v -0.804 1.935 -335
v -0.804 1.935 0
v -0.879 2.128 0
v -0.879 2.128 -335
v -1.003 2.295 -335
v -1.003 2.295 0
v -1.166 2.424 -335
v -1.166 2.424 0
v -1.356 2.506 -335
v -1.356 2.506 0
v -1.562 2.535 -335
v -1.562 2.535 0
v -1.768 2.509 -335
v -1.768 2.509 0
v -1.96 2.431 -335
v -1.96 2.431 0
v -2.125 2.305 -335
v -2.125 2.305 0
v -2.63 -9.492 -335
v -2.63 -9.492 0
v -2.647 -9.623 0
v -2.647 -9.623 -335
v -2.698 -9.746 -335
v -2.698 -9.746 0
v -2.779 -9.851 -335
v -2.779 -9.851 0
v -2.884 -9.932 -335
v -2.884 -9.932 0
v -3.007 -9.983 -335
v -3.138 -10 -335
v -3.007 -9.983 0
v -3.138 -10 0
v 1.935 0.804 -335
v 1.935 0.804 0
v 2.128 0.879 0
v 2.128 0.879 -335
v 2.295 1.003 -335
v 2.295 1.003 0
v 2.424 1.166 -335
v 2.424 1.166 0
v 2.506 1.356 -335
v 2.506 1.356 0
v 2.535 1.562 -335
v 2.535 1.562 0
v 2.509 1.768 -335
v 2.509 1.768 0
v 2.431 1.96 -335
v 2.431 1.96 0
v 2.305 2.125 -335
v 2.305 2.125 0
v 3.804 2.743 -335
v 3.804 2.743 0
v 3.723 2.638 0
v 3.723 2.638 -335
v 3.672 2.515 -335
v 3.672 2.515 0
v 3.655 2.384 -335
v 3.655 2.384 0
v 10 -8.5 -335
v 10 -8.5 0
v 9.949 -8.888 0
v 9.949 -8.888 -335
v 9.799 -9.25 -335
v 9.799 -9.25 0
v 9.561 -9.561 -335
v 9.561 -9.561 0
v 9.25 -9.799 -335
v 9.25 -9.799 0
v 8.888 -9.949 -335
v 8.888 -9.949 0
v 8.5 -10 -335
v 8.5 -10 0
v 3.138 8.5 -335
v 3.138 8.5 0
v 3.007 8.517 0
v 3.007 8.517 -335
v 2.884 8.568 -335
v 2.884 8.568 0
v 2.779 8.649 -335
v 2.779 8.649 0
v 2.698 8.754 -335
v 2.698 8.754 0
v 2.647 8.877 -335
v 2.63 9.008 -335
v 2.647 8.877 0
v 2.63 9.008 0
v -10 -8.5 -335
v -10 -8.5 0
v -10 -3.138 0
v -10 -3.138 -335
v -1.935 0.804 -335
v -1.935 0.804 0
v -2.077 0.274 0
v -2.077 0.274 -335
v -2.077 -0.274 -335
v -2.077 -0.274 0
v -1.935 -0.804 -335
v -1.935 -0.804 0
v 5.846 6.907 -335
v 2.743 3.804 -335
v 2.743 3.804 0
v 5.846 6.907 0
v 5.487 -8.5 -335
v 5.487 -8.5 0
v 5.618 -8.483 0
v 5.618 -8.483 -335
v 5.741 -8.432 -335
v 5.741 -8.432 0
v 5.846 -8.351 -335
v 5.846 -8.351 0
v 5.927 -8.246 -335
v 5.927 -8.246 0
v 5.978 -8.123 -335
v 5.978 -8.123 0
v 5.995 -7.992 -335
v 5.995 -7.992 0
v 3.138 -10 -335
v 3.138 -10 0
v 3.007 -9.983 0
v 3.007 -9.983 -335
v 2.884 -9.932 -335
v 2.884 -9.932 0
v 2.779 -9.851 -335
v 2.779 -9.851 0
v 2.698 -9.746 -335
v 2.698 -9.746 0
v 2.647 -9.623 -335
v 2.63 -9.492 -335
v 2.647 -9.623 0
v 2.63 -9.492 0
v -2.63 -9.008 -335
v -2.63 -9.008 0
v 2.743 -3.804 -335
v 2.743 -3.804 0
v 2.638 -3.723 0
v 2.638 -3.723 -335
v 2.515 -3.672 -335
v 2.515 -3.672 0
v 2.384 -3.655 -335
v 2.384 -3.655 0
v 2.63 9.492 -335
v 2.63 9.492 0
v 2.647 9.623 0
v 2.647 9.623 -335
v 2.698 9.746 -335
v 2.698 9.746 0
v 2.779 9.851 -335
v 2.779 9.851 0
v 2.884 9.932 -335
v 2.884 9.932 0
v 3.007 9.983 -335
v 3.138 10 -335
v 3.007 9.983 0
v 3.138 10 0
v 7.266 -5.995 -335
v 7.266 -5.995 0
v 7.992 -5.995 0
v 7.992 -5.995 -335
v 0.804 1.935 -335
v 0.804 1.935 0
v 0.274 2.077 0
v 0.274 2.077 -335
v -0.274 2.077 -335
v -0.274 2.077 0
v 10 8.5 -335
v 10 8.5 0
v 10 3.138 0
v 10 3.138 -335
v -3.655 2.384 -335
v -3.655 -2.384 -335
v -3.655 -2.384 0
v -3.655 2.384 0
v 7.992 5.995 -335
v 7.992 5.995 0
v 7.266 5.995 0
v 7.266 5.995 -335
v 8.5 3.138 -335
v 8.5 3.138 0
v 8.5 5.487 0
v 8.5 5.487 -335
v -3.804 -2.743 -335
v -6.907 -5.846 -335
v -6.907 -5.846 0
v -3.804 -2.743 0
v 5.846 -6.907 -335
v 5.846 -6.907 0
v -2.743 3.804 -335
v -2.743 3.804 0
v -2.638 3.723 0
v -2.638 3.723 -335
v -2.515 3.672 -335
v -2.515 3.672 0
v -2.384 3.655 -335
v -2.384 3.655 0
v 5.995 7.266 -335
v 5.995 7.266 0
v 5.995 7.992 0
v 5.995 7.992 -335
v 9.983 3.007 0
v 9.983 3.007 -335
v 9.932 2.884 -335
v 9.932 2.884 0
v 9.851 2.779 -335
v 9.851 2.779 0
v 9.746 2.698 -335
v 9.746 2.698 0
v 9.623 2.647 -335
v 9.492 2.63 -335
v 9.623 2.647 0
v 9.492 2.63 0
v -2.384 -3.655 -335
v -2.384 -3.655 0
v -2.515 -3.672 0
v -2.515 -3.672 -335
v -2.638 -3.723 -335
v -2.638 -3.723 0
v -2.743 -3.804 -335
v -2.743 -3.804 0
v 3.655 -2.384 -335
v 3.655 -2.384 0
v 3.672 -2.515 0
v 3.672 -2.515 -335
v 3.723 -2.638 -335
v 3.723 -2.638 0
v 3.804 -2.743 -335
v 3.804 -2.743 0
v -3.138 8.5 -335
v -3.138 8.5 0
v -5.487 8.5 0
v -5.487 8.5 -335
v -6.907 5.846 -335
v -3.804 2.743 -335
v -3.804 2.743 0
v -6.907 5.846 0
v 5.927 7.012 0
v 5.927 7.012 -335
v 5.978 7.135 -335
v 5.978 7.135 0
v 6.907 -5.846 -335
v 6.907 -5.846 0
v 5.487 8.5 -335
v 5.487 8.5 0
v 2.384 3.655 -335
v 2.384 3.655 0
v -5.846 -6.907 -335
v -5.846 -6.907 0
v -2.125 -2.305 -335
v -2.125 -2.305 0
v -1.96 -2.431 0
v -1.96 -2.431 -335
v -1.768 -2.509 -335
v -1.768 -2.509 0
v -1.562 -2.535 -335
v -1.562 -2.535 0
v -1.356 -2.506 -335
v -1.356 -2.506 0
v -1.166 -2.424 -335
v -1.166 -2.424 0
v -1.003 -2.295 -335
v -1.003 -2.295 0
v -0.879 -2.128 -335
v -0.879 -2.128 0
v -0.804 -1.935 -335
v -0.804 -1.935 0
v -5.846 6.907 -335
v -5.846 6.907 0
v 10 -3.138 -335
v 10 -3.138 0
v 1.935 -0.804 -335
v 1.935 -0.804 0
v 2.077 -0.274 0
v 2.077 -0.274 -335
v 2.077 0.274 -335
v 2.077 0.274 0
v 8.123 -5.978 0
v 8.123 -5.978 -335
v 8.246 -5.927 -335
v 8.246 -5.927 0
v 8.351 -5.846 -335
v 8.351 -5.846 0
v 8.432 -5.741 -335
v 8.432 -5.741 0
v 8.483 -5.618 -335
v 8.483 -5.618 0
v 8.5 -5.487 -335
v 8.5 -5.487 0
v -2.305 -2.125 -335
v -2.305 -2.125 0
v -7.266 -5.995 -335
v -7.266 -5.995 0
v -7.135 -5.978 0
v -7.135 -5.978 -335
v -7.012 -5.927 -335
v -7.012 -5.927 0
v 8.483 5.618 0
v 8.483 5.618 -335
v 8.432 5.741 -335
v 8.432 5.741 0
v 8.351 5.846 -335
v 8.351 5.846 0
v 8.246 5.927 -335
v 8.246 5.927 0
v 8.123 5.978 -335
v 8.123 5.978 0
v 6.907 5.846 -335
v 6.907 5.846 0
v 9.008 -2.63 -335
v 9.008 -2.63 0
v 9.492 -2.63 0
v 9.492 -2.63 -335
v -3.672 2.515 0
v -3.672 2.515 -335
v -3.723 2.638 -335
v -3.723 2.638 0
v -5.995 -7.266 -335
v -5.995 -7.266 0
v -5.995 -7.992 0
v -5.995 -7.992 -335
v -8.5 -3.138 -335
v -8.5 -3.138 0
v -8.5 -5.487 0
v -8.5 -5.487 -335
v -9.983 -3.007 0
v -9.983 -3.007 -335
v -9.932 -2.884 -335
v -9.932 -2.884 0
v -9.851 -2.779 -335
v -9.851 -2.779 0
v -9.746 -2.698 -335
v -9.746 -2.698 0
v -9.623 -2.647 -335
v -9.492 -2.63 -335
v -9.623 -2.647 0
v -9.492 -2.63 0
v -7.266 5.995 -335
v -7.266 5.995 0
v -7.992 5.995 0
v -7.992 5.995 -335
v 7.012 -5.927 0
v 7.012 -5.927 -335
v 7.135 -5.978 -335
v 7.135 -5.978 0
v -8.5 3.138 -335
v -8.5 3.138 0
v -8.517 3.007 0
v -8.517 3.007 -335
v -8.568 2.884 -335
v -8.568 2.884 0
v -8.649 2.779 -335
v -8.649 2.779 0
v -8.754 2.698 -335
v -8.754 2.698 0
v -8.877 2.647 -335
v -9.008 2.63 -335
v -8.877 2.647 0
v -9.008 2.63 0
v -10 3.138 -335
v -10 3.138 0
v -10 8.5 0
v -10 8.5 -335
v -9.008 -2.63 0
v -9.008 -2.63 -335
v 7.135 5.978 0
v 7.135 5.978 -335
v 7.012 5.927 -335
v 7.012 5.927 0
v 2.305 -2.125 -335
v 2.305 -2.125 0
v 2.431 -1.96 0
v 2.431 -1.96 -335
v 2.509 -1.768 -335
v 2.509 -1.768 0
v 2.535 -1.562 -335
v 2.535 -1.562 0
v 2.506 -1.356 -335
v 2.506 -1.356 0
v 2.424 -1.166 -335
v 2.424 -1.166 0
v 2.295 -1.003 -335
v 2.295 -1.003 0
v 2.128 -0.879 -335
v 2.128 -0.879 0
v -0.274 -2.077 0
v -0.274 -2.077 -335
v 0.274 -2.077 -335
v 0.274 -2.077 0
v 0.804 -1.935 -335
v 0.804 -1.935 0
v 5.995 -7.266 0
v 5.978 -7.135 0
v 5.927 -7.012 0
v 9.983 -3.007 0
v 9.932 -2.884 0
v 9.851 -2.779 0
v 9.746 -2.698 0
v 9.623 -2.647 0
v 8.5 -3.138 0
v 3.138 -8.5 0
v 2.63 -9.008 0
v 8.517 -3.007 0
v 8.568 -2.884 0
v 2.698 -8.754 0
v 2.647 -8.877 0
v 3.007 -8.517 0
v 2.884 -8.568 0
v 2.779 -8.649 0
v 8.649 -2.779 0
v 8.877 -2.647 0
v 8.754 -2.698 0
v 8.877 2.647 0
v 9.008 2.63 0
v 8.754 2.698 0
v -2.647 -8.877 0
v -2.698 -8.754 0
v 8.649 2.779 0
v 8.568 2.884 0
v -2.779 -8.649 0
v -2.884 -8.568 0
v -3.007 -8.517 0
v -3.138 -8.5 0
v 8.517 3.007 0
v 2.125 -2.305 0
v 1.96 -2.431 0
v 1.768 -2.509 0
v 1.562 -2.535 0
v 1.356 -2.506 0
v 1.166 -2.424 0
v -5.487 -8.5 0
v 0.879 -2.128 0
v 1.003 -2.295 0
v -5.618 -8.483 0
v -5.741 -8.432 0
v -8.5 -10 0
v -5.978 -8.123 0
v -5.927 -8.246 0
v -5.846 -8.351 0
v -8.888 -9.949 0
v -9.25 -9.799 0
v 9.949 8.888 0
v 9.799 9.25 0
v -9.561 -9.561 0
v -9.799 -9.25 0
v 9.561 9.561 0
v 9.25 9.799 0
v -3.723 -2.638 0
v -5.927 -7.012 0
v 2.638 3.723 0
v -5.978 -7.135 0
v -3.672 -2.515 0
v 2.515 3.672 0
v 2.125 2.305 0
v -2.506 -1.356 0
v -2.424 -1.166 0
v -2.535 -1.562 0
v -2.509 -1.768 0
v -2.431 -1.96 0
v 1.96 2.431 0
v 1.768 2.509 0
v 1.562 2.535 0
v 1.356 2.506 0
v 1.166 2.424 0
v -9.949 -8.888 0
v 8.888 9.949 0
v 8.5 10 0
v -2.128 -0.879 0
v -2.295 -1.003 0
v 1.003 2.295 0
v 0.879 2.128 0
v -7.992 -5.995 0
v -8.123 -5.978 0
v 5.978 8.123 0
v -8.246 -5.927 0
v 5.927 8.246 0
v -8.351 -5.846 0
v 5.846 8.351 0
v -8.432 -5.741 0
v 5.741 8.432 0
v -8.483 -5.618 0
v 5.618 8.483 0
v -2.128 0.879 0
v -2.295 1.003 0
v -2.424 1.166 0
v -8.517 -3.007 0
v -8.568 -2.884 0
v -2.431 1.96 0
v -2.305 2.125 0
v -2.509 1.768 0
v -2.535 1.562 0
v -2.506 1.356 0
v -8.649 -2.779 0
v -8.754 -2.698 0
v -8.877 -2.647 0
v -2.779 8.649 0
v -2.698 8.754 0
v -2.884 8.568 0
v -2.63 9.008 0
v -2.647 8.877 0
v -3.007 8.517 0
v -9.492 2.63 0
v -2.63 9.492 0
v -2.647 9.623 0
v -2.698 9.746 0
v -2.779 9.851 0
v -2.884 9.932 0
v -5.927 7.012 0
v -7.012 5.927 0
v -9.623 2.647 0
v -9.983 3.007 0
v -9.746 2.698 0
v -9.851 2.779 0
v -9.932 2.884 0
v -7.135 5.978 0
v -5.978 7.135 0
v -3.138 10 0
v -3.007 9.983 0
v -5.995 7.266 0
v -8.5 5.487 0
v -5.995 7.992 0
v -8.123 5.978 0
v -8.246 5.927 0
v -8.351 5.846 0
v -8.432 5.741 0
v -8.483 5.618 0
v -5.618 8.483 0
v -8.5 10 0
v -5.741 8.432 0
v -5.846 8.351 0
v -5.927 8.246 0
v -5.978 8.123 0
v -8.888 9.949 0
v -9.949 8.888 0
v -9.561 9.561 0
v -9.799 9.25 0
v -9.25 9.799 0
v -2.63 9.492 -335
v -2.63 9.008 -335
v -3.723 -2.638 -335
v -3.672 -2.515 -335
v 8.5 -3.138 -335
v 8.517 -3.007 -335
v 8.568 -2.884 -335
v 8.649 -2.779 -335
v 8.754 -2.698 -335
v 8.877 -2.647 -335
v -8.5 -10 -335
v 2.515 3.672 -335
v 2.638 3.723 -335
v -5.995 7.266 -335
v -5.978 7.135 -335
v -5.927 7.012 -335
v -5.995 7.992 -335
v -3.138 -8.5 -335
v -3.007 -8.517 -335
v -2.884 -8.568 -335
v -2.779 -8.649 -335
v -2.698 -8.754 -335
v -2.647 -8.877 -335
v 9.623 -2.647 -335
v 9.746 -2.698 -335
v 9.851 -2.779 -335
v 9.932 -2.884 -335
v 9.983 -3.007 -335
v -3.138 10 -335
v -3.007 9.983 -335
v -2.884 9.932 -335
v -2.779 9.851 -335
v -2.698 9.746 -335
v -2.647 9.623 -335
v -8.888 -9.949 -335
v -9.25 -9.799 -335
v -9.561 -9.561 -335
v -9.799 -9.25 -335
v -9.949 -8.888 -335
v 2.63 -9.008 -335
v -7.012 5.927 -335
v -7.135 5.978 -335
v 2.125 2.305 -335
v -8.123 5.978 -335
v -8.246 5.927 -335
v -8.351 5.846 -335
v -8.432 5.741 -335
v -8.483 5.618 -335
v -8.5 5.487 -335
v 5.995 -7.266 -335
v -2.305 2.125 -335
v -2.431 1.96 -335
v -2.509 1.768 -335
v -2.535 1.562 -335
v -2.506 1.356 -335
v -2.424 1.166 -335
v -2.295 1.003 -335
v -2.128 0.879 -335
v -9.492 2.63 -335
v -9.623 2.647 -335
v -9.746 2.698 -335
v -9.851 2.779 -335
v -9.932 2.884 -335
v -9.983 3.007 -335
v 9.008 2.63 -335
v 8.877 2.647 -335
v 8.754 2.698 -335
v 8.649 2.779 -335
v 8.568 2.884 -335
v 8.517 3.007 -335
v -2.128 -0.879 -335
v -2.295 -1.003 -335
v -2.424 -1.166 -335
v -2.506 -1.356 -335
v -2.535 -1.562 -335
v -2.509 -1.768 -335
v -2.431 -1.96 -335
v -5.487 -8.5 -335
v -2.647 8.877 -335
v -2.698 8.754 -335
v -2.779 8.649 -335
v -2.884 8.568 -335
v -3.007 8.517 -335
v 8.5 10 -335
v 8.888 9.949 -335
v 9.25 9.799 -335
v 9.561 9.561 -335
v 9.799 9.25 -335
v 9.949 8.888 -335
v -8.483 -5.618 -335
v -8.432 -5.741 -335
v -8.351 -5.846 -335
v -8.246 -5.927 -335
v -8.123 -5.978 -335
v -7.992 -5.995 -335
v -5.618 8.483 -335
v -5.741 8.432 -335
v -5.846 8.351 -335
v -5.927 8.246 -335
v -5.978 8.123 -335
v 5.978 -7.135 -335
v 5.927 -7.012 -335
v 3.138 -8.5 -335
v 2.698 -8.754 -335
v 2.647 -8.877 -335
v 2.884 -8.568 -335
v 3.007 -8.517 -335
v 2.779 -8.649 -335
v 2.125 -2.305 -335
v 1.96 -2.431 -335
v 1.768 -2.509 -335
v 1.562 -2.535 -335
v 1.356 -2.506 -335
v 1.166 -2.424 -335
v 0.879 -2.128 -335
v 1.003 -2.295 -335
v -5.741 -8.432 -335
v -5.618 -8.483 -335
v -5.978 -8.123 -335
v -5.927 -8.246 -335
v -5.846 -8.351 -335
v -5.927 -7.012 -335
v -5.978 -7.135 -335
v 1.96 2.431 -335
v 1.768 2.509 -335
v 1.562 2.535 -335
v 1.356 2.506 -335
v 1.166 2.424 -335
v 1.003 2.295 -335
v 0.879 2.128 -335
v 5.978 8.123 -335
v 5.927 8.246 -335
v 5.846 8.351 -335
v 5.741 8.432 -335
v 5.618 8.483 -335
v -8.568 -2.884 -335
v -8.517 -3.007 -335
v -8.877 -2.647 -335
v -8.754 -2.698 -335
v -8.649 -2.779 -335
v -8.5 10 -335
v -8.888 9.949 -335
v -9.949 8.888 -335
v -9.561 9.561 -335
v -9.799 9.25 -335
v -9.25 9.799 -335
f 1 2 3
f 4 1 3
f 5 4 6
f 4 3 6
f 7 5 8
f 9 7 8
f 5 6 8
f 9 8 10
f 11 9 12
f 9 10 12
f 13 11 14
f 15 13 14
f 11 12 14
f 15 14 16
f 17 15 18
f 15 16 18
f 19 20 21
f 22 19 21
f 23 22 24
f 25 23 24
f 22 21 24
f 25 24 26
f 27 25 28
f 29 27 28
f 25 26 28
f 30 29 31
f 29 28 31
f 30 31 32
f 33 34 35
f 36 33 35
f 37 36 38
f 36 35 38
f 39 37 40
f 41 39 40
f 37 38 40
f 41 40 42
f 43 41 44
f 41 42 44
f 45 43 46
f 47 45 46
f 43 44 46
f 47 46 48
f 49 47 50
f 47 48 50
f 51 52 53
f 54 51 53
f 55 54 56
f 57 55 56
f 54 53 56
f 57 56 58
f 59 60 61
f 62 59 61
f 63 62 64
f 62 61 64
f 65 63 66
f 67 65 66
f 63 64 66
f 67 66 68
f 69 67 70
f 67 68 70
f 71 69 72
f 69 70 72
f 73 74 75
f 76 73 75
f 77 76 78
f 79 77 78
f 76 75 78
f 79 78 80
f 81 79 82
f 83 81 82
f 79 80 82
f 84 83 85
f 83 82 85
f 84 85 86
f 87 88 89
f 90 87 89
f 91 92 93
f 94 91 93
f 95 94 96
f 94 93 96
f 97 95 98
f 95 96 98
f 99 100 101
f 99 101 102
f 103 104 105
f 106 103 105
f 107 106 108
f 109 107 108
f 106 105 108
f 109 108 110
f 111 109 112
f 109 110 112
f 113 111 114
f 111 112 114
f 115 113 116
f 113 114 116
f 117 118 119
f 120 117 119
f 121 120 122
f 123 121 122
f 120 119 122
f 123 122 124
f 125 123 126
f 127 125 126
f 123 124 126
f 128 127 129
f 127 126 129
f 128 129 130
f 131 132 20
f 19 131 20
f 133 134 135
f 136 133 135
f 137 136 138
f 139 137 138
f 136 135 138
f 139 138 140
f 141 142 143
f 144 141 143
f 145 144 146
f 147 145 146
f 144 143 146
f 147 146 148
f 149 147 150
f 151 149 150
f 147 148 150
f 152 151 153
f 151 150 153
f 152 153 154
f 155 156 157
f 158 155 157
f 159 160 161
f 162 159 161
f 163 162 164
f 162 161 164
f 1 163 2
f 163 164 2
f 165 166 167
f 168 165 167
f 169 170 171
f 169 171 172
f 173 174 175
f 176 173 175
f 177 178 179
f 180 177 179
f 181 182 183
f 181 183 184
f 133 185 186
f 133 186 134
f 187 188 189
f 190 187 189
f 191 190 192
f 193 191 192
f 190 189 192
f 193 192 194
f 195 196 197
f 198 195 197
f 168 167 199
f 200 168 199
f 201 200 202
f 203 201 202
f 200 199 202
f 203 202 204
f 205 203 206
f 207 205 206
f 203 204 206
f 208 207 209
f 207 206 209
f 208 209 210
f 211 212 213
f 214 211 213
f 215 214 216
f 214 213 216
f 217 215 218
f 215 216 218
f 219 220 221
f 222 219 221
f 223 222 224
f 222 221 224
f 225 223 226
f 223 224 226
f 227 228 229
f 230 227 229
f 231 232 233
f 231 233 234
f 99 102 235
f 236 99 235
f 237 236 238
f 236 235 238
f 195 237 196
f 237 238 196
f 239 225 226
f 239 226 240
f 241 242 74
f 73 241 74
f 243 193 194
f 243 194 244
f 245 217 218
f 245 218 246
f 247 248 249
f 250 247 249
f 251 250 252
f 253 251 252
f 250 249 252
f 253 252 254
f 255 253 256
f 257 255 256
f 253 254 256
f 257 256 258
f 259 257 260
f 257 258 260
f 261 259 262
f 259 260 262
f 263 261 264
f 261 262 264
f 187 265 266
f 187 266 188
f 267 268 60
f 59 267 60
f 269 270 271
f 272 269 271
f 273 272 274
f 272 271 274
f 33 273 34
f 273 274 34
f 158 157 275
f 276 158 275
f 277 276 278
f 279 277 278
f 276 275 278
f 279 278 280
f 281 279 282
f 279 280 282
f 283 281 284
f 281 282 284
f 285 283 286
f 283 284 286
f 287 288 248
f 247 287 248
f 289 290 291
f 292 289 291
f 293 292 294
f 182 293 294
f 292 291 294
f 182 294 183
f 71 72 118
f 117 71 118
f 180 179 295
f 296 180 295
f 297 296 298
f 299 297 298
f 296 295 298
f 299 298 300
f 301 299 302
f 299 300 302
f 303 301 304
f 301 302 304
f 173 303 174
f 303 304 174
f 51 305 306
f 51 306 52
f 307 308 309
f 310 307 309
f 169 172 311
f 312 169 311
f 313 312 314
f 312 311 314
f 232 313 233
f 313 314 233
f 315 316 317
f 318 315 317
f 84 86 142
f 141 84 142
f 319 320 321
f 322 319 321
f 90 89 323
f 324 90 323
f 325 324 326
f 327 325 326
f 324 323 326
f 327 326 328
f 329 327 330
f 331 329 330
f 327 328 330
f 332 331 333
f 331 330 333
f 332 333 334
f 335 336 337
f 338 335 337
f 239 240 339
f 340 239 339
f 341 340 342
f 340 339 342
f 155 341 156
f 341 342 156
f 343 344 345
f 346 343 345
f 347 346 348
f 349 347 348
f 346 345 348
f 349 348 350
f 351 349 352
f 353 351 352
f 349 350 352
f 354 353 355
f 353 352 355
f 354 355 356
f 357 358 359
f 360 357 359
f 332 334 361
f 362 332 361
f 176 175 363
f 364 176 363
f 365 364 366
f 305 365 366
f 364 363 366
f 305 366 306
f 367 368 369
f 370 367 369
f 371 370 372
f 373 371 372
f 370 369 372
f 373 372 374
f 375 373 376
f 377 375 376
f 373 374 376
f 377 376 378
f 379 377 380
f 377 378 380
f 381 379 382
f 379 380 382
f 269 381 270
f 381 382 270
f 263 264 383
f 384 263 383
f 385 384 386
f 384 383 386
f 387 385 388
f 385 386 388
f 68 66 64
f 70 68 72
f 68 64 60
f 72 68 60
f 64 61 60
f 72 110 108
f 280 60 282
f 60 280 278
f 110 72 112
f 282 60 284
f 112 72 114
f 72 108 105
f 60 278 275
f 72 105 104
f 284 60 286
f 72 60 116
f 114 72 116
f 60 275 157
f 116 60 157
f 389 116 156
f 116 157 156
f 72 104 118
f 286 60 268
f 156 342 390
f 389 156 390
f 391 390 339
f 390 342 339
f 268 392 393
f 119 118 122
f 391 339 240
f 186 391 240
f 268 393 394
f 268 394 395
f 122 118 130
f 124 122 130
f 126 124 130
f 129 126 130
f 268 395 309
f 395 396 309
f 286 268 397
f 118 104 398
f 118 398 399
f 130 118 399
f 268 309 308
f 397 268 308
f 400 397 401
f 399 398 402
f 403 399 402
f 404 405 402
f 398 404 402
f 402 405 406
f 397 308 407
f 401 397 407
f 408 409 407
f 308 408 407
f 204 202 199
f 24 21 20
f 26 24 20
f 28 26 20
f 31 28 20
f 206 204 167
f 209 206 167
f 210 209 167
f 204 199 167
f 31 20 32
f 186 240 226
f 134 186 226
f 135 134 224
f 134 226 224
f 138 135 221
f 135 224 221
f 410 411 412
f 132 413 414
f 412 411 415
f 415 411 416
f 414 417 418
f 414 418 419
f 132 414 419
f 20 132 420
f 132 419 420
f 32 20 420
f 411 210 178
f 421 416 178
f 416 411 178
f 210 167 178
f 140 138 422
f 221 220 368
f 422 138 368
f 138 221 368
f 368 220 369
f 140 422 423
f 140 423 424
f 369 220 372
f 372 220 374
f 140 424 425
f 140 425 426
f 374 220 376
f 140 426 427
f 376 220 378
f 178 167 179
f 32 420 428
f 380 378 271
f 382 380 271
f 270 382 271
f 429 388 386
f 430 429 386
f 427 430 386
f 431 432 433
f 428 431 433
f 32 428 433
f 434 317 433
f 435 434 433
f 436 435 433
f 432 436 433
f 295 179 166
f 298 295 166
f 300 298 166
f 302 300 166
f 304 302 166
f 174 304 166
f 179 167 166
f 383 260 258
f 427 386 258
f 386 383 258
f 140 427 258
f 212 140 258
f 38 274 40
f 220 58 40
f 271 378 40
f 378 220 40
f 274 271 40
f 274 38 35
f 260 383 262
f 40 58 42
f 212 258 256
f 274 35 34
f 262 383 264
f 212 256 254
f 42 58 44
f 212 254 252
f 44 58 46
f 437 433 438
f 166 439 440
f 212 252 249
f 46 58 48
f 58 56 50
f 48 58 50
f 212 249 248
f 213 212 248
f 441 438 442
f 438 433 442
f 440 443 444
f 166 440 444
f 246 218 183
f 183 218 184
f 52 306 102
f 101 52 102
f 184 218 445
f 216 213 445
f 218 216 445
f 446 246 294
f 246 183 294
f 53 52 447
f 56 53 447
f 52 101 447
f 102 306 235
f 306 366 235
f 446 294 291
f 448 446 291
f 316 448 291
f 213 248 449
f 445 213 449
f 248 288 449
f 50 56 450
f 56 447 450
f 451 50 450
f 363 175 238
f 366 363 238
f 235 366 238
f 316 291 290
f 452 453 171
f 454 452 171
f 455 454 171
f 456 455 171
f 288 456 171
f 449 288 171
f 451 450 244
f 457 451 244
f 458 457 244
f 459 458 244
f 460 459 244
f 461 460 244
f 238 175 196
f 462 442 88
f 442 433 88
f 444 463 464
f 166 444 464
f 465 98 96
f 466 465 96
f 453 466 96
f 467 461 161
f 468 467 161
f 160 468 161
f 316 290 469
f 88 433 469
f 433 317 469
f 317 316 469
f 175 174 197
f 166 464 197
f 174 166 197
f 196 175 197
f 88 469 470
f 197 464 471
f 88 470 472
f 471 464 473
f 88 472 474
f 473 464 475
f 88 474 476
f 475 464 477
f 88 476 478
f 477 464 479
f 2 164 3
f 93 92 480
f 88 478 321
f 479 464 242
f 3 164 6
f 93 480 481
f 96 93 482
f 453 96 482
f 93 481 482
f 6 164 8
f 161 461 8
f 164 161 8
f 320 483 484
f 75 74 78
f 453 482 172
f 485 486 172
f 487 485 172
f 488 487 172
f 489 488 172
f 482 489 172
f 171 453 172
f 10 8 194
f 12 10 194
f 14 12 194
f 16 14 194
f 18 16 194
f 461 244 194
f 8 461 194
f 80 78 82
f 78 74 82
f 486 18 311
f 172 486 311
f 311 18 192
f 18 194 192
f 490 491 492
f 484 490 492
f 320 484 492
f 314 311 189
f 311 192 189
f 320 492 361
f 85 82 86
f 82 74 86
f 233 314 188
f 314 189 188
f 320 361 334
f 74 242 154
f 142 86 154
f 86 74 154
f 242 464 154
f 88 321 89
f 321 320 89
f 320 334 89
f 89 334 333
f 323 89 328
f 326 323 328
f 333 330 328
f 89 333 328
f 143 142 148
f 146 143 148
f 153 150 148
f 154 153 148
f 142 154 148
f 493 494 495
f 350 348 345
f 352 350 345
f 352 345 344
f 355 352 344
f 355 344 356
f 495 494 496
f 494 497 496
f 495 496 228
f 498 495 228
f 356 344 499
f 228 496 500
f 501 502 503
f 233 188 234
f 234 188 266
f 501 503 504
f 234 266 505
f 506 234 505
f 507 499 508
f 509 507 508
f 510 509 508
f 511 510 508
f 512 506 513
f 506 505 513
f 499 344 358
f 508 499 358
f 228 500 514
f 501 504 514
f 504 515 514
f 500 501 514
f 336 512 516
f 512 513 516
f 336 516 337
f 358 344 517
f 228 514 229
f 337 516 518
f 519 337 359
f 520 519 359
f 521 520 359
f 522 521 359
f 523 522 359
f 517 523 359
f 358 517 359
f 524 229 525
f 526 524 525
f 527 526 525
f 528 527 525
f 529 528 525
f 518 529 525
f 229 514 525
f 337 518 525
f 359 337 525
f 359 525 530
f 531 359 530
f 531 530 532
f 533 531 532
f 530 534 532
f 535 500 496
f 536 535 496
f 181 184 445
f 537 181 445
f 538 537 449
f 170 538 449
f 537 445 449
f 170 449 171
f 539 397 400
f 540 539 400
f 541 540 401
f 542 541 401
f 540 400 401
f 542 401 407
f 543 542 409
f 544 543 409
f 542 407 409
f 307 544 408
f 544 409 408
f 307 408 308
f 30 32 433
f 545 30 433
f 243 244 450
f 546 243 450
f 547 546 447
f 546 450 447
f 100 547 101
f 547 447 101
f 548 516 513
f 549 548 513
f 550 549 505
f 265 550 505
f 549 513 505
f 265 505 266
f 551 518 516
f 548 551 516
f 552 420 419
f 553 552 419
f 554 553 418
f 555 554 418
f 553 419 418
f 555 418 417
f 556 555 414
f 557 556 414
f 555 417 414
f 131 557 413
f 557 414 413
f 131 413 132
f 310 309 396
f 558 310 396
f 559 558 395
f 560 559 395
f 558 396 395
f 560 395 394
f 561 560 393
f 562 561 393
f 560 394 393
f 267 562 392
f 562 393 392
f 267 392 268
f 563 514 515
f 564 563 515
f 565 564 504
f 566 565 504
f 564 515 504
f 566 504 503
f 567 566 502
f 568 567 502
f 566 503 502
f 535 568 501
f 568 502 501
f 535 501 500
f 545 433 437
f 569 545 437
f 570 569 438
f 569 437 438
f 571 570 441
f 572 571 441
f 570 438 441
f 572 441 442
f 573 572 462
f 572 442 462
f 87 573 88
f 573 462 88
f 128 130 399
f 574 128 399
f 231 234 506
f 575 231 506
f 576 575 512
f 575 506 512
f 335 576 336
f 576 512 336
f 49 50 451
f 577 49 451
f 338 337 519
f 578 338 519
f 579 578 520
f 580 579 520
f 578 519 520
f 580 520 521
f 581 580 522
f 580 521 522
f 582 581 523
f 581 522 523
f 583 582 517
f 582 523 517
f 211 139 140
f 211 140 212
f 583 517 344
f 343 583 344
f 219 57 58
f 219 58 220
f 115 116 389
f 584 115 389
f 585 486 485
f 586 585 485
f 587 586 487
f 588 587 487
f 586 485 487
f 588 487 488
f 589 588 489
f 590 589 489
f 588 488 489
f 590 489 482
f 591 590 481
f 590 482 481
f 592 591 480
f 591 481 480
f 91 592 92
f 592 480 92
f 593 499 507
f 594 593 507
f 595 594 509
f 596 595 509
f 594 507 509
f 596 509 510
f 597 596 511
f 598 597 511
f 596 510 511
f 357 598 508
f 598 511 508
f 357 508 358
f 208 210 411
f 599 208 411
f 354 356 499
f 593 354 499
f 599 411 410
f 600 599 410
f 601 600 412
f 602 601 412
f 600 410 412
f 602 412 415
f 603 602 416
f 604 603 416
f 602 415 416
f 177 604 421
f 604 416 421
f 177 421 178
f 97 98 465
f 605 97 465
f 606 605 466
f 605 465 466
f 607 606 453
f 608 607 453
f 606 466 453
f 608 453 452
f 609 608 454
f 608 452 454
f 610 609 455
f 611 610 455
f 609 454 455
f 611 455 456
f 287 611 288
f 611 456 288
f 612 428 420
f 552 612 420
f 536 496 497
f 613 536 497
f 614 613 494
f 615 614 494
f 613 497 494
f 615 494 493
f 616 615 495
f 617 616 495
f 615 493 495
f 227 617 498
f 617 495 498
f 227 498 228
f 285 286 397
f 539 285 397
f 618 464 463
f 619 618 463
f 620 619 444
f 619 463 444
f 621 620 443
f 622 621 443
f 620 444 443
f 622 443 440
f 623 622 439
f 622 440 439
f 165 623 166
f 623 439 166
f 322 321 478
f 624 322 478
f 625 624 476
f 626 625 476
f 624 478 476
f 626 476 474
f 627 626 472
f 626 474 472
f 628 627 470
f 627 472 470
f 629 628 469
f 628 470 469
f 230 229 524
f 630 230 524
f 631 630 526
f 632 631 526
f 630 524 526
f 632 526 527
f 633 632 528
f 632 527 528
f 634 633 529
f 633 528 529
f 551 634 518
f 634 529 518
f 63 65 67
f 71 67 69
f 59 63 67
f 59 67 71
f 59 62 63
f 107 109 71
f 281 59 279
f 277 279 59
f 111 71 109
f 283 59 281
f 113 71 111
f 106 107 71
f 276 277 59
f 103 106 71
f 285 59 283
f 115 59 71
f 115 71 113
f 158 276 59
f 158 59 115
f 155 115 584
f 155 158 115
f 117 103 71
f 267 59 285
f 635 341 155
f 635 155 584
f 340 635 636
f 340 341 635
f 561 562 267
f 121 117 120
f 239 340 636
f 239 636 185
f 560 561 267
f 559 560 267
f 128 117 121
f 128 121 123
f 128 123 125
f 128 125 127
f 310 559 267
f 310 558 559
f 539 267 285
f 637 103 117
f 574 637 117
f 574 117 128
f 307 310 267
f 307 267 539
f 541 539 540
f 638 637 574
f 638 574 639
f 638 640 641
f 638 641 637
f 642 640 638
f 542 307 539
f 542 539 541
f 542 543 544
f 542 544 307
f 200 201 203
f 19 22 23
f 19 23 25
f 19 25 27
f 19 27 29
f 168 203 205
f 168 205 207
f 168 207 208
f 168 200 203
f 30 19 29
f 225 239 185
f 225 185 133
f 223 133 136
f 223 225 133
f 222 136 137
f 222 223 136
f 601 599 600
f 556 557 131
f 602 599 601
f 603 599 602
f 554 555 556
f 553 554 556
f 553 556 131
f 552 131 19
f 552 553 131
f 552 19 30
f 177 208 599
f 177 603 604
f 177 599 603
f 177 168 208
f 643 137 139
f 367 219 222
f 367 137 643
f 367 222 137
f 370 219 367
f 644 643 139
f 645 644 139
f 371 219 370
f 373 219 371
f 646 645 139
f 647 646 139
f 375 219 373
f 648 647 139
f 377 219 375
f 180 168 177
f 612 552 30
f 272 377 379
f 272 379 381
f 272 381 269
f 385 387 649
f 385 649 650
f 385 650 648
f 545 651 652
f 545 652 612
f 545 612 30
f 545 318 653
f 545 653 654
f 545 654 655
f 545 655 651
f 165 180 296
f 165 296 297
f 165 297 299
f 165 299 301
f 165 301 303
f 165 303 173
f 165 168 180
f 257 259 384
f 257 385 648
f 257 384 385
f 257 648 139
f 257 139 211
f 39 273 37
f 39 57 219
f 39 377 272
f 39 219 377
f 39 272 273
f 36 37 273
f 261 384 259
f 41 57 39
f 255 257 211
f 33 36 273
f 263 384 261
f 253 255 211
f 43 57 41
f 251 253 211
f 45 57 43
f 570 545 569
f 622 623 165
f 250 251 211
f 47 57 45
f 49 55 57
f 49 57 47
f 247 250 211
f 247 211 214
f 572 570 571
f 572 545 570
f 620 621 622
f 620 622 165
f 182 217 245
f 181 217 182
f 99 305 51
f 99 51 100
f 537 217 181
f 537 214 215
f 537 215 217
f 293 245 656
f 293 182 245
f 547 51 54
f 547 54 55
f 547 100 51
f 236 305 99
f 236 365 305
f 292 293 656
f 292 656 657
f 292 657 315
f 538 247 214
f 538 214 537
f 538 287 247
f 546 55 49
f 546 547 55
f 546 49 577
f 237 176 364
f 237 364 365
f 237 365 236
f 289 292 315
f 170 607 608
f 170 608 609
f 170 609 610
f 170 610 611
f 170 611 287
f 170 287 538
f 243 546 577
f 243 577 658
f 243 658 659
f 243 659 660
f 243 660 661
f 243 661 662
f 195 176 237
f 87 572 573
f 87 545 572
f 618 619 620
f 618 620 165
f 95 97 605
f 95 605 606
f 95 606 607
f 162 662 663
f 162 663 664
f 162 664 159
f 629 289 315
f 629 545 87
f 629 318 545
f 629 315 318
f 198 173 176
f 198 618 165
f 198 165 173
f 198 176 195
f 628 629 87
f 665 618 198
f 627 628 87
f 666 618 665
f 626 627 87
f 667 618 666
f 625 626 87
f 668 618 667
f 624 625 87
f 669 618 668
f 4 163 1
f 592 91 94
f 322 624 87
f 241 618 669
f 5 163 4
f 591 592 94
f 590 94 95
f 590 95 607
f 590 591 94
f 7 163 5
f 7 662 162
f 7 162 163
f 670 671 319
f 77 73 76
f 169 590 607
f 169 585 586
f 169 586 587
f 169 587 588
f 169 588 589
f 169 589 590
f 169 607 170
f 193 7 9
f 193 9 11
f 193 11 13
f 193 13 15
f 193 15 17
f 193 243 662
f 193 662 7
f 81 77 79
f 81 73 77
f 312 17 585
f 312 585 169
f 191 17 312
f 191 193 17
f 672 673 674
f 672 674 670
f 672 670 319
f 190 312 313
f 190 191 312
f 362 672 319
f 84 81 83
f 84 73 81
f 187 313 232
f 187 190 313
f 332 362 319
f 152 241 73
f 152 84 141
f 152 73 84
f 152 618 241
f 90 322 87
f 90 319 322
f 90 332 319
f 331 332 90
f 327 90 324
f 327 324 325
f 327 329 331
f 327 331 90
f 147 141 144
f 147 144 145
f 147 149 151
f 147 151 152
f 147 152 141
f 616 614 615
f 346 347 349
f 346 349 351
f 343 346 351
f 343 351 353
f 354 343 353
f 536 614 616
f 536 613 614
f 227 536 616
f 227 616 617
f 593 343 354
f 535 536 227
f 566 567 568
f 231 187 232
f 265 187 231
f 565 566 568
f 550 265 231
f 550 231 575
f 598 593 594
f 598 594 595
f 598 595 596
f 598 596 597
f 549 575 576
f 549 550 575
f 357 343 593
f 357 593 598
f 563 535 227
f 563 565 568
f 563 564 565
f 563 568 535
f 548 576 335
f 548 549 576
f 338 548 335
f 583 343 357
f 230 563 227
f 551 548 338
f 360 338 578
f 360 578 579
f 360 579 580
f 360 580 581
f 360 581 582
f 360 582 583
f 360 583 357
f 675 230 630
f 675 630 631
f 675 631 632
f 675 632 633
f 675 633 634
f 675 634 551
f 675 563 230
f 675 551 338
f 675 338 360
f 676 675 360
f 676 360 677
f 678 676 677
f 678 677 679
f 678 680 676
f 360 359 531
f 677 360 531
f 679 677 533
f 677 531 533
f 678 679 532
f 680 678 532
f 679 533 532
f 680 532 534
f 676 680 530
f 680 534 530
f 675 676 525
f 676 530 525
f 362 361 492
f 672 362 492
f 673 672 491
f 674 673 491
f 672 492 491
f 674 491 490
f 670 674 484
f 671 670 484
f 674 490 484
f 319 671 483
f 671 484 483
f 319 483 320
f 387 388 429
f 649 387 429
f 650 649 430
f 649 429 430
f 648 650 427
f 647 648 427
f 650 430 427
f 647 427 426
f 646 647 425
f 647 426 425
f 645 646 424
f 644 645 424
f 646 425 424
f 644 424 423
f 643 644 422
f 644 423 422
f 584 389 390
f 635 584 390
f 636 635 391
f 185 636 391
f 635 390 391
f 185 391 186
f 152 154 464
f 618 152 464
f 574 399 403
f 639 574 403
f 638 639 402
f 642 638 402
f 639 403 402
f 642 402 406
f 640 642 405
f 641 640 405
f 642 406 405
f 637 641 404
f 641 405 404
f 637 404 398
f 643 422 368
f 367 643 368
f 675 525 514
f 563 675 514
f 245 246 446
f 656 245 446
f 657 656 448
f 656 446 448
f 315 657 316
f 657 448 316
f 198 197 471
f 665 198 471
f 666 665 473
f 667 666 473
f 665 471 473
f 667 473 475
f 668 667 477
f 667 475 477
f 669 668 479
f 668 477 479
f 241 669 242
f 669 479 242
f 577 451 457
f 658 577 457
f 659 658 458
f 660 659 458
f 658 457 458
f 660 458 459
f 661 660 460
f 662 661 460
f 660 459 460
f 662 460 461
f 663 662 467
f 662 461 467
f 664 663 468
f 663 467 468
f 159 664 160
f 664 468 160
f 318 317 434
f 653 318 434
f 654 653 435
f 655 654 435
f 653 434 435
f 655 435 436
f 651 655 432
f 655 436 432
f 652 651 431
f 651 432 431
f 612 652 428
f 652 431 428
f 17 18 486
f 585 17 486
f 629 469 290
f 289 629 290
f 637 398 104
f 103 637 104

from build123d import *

# Parameters (mm, degrees)
EXTRUDE1_DEPTH = 335


with BuildPart() as part:
    # Sketch1 → Extrude1 (new body)
    with BuildSketch(Plane.XY):
        with BuildLine():
            Line((9.492, 2.63), (9.008, 2.63))
            ThreePointArc((9.008, 2.63), (8.648789755, 2.778789755), (8.5, 3.138))
            Line((8.5, 3.138), (8.5, 5.487))
            ThreePointArc((8.5, 5.487), (8.351210245, 5.846210245), (7.992, 5.995))
            Line((7.992, 5.995), (7.266080661, 5.995))
            ThreePointArc((7.266080661, 5.995), (7.071677478, 5.956330803), (6.906870417, 5.846210245))
            Line((6.906870417, 5.846210245), (3.803789755, 2.743129583))
            ThreePointArc((3.803789755, 2.743129583), (3.693669197, 2.578322522), (3.655, 2.383919339))
            Line((3.655, 2.383919339), (3.655, -2.383919339))
            ThreePointArc((3.655, -2.383919339), (3.693669197, -2.578322522), (3.803789755, -2.743129583))
            Line((3.803789755, -2.743129583), (6.906870417, -5.846210245))
            ThreePointArc((6.906870417, -5.846210245), (7.071677478, -5.956330803), (7.266080661, -5.995))
            Line((7.266080661, -5.995), (7.992, -5.995))
            ThreePointArc((7.992, -5.995), (8.351210245, -5.846210245), (8.5, -5.487))
            Line((8.5, -5.487), (8.5, -3.138))
            ThreePointArc((8.5, -3.138), (8.648789755, -2.778789755), (9.008, -2.63))
            Line((9.008, -2.63), (9.492, -2.63))
            ThreePointArc((9.492, -2.63), (9.851210245, -2.778789755), (10, -3.138))
            Line((10, -3.138), (10, -8.5))
            ThreePointArc((10, -8.5), (9.560660172, -9.560660172), (8.5, -10))
            Line((8.5, -10), (3.138, -10))
            ThreePointArc((3.138, -10), (2.778789755, -9.851210245), (2.63, -9.492))
            Line((2.63, -9.492), (2.63, -9.008))
            ThreePointArc((2.63, -9.008), (2.778789755, -8.648789755), (3.138, -8.5))
            Line((3.138, -8.5), (5.487, -8.5))
            ThreePointArc((5.487, -8.5), (5.846210245, -8.351210245), (5.995, -7.992))
            Line((5.995, -7.992), (5.995, -7.266080661))
            ThreePointArc((5.995, -7.266080661), (5.956330803, -7.071677478), (5.846210245, -6.906870417))
            Line((5.846210245, -6.906870417), (2.743129583, -3.803789755))
            ThreePointArc((2.743129583, -3.803789755), (2.578322522, -3.693669197), (2.383919339, -3.655))
            Line((2.383919339, -3.655), (-2.383919339, -3.655))
            ThreePointArc((-2.383919339, -3.655), (-2.578322522, -3.693669197), (-2.743129583, -3.803789755))
            Line((-2.743129583, -3.803789755), (-5.846210245, -6.906870417))
            ThreePointArc((-5.846210245, -6.906870417), (-5.956330803, -7.071677478), (-5.995, -7.266080661))
            Line((-5.995, -7.266080661), (-5.995, -7.992))
            ThreePointArc((-5.995, -7.992), (-5.846210245, -8.351210245), (-5.487, -8.5))
            Line((-5.487, -8.5), (-3.138, -8.5))
            ThreePointArc((-3.138, -8.5), (-2.778789755, -8.648789755), (-2.63, -9.008))
            Line((-2.63, -9.008), (-2.63, -9.492))
            ThreePointArc((-2.63, -9.492), (-2.778789755, -9.851210245), (-3.138, -10))
            Line((-3.138, -10), (-8.5, -10))
            ThreePointArc((-8.5, -10), (-9.560660172, -9.560660172), (-10, -8.5))
            Line((-10, -8.5), (-10, -3.138))
            ThreePointArc((-10, -3.138), (-9.851210245, -2.778789755), (-9.492, -2.63))
            Line((-9.492, -2.63), (-9.008, -2.63))
            ThreePointArc((-9.008, -2.63), (-8.648789755, -2.778789755), (-8.5, -3.138))
            Line((-8.5, -3.138), (-8.5, -5.487))
            ThreePointArc((-8.5, -5.487), (-8.351210245, -5.846210245), (-7.992, -5.995))
            Line((-7.992, -5.995), (-7.266080661, -5.995))
            ThreePointArc((-7.266080661, -5.995), (-7.071677478, -5.956330803), (-6.906870417, -5.846210245))
            Line((-6.906870417, -5.846210245), (-3.803789755, -2.743129583))
            ThreePointArc((-3.803789755, -2.743129583), (-3.693669197, -2.578322522), (-3.655, -2.383919339))
            Line((-3.655, -2.383919339), (-3.655, 2.383919339))
            ThreePointArc((-3.655, 2.383919339), (-3.693669197, 2.578322522), (-3.803789755, 2.743129583))
            Line((-3.803789755, 2.743129583), (-6.906870417, 5.846210245))
            ThreePointArc((-6.906870417, 5.846210245), (-7.071677478, 5.956330803), (-7.266080661, 5.995))
            Line((-7.266080661, 5.995), (-7.992, 5.995))
            ThreePointArc((-7.992, 5.995), (-8.351210245, 5.846210245), (-8.5, 5.487))
            Line((-8.5, 5.487), (-8.5, 3.138))
            ThreePointArc((-8.5, 3.138), (-8.648789755, 2.778789755), (-9.008, 2.63))
            Line((-9.008, 2.63), (-9.492, 2.63))
            ThreePointArc((-9.492, 2.63), (-9.851210245, 2.778789755), (-10, 3.138))
            Line((-10, 3.138), (-10, 8.5))
            ThreePointArc((-10, 8.5), (-9.560660172, 9.560660172), (-8.5, 10))
            Line((-8.5, 10), (-3.138, 10))
            ThreePointArc((-3.138, 10), (-2.778789755, 9.851210245), (-2.63, 9.492))
            Line((-2.63, 9.492), (-2.63, 9.008))
            ThreePointArc((-2.63, 9.008), (-2.778789755, 8.648789755), (-3.138, 8.5))
            Line((-3.138, 8.5), (-5.487, 8.5))
            ThreePointArc((-5.487, 8.5), (-5.846210245, 8.351210245), (-5.995, 7.992))
            Line((-5.995, 7.992), (-5.995, 7.266080661))
            ThreePointArc((-5.995, 7.266080661), (-5.956330803, 7.071677478), (-5.846210245, 6.906870417))
            Line((-5.846210245, 6.906870417), (-2.743129583, 3.803789755))
            ThreePointArc((-2.743129583, 3.803789755), (-2.578322522, 3.693669197), (-2.383919339, 3.655))
            Line((-2.383919339, 3.655), (2.383919339, 3.655))
            ThreePointArc((2.383919339, 3.655), (2.578322522, 3.693669197), (2.743129583, 3.803789755))
            Line((2.743129583, 3.803789755), (5.846210245, 6.906870417))
            ThreePointArc((5.846210245, 6.906870417), (5.956330803, 7.071677478), (5.995, 7.266080661))
            Line((5.995, 7.266080661), (5.995, 7.992))
            ThreePointArc((5.995, 7.992), (5.846210245, 8.351210245), (5.487, 8.5))
            Line((5.487, 8.5), (3.138, 8.5))
            ThreePointArc((3.138, 8.5), (2.778789755, 8.648789755), (2.63, 9.008))
            Line((2.63, 9.008), (2.63, 9.492))
            ThreePointArc((2.63, 9.492), (2.778789755, 9.851210245), (3.138, 10))
            Line((3.138, 10), (8.5, 10))
            ThreePointArc((8.5, 10), (9.560660172, 9.560660172), (10, 8.5))
            Line((10, 8.5), (10, 3.138))
            ThreePointArc((10, 3.138), (9.851210245, 2.778789755), (9.492, 2.63))
        make_face()
        with BuildLine():
            Line((2.124900844, -2.304505966), (2.304505966, -2.124900844))
            ThreePointArc((2.304505966, -2.124900844), (2.505938017, -1.356467811), (1.935133506, -0.803976718))
            ThreePointArc((1.935133506, -0.803976718), (2.0955, 0), (1.935133506, 0.803976718))
            ThreePointArc((1.935133506, 0.803976718), (2.505938017, 1.356467811), (2.304505966, 2.124900844))
            Line((2.304505966, 2.124900844), (2.124900844, 2.304505966))
            ThreePointArc((2.124900844, 2.304505966), (1.356467811, 2.505938017), (0.803976718, 1.935133506))
            ThreePointArc((0.803976718, 1.935133506), (0, 2.0955), (-0.803976718, 1.935133506))
            ThreePointArc((-0.803976718, 1.935133506), (-1.356467811, 2.505938017), (-2.124900844, 2.304505966))
            Line((-2.124900844, 2.304505966), (-2.304505966, 2.124900844))
            ThreePointArc((-2.304505966, 2.124900844), (-2.505938017, 1.356467811), (-1.935133506, 0.803976718))
            ThreePointArc((-1.935133506, 0.803976718), (-2.0955, 0), (-1.935133506, -0.803976718))
            ThreePointArc((-1.935133506, -0.803976718), (-2.505938017, -1.356467811), (-2.304505966, -2.124900844))
            Line((-2.304505966, -2.124900844), (-2.124900844, -2.304505966))
            ThreePointArc((-2.124900844, -2.304505966), (-1.356467811, -2.505938017), (-0.803976718, -1.935133506))
            ThreePointArc((-0.803976718, -1.935133506), (0, -2.0955), (0.803976718, -1.935133506))
            ThreePointArc((0.803976718, -1.935133506), (1.356467811, -2.505938017), (2.124900844, -2.304505966))
        make_face(mode=Mode.SUBTRACT)
    extrude(amount=-EXTRUDE1_DEPTH)


solid = part.part
